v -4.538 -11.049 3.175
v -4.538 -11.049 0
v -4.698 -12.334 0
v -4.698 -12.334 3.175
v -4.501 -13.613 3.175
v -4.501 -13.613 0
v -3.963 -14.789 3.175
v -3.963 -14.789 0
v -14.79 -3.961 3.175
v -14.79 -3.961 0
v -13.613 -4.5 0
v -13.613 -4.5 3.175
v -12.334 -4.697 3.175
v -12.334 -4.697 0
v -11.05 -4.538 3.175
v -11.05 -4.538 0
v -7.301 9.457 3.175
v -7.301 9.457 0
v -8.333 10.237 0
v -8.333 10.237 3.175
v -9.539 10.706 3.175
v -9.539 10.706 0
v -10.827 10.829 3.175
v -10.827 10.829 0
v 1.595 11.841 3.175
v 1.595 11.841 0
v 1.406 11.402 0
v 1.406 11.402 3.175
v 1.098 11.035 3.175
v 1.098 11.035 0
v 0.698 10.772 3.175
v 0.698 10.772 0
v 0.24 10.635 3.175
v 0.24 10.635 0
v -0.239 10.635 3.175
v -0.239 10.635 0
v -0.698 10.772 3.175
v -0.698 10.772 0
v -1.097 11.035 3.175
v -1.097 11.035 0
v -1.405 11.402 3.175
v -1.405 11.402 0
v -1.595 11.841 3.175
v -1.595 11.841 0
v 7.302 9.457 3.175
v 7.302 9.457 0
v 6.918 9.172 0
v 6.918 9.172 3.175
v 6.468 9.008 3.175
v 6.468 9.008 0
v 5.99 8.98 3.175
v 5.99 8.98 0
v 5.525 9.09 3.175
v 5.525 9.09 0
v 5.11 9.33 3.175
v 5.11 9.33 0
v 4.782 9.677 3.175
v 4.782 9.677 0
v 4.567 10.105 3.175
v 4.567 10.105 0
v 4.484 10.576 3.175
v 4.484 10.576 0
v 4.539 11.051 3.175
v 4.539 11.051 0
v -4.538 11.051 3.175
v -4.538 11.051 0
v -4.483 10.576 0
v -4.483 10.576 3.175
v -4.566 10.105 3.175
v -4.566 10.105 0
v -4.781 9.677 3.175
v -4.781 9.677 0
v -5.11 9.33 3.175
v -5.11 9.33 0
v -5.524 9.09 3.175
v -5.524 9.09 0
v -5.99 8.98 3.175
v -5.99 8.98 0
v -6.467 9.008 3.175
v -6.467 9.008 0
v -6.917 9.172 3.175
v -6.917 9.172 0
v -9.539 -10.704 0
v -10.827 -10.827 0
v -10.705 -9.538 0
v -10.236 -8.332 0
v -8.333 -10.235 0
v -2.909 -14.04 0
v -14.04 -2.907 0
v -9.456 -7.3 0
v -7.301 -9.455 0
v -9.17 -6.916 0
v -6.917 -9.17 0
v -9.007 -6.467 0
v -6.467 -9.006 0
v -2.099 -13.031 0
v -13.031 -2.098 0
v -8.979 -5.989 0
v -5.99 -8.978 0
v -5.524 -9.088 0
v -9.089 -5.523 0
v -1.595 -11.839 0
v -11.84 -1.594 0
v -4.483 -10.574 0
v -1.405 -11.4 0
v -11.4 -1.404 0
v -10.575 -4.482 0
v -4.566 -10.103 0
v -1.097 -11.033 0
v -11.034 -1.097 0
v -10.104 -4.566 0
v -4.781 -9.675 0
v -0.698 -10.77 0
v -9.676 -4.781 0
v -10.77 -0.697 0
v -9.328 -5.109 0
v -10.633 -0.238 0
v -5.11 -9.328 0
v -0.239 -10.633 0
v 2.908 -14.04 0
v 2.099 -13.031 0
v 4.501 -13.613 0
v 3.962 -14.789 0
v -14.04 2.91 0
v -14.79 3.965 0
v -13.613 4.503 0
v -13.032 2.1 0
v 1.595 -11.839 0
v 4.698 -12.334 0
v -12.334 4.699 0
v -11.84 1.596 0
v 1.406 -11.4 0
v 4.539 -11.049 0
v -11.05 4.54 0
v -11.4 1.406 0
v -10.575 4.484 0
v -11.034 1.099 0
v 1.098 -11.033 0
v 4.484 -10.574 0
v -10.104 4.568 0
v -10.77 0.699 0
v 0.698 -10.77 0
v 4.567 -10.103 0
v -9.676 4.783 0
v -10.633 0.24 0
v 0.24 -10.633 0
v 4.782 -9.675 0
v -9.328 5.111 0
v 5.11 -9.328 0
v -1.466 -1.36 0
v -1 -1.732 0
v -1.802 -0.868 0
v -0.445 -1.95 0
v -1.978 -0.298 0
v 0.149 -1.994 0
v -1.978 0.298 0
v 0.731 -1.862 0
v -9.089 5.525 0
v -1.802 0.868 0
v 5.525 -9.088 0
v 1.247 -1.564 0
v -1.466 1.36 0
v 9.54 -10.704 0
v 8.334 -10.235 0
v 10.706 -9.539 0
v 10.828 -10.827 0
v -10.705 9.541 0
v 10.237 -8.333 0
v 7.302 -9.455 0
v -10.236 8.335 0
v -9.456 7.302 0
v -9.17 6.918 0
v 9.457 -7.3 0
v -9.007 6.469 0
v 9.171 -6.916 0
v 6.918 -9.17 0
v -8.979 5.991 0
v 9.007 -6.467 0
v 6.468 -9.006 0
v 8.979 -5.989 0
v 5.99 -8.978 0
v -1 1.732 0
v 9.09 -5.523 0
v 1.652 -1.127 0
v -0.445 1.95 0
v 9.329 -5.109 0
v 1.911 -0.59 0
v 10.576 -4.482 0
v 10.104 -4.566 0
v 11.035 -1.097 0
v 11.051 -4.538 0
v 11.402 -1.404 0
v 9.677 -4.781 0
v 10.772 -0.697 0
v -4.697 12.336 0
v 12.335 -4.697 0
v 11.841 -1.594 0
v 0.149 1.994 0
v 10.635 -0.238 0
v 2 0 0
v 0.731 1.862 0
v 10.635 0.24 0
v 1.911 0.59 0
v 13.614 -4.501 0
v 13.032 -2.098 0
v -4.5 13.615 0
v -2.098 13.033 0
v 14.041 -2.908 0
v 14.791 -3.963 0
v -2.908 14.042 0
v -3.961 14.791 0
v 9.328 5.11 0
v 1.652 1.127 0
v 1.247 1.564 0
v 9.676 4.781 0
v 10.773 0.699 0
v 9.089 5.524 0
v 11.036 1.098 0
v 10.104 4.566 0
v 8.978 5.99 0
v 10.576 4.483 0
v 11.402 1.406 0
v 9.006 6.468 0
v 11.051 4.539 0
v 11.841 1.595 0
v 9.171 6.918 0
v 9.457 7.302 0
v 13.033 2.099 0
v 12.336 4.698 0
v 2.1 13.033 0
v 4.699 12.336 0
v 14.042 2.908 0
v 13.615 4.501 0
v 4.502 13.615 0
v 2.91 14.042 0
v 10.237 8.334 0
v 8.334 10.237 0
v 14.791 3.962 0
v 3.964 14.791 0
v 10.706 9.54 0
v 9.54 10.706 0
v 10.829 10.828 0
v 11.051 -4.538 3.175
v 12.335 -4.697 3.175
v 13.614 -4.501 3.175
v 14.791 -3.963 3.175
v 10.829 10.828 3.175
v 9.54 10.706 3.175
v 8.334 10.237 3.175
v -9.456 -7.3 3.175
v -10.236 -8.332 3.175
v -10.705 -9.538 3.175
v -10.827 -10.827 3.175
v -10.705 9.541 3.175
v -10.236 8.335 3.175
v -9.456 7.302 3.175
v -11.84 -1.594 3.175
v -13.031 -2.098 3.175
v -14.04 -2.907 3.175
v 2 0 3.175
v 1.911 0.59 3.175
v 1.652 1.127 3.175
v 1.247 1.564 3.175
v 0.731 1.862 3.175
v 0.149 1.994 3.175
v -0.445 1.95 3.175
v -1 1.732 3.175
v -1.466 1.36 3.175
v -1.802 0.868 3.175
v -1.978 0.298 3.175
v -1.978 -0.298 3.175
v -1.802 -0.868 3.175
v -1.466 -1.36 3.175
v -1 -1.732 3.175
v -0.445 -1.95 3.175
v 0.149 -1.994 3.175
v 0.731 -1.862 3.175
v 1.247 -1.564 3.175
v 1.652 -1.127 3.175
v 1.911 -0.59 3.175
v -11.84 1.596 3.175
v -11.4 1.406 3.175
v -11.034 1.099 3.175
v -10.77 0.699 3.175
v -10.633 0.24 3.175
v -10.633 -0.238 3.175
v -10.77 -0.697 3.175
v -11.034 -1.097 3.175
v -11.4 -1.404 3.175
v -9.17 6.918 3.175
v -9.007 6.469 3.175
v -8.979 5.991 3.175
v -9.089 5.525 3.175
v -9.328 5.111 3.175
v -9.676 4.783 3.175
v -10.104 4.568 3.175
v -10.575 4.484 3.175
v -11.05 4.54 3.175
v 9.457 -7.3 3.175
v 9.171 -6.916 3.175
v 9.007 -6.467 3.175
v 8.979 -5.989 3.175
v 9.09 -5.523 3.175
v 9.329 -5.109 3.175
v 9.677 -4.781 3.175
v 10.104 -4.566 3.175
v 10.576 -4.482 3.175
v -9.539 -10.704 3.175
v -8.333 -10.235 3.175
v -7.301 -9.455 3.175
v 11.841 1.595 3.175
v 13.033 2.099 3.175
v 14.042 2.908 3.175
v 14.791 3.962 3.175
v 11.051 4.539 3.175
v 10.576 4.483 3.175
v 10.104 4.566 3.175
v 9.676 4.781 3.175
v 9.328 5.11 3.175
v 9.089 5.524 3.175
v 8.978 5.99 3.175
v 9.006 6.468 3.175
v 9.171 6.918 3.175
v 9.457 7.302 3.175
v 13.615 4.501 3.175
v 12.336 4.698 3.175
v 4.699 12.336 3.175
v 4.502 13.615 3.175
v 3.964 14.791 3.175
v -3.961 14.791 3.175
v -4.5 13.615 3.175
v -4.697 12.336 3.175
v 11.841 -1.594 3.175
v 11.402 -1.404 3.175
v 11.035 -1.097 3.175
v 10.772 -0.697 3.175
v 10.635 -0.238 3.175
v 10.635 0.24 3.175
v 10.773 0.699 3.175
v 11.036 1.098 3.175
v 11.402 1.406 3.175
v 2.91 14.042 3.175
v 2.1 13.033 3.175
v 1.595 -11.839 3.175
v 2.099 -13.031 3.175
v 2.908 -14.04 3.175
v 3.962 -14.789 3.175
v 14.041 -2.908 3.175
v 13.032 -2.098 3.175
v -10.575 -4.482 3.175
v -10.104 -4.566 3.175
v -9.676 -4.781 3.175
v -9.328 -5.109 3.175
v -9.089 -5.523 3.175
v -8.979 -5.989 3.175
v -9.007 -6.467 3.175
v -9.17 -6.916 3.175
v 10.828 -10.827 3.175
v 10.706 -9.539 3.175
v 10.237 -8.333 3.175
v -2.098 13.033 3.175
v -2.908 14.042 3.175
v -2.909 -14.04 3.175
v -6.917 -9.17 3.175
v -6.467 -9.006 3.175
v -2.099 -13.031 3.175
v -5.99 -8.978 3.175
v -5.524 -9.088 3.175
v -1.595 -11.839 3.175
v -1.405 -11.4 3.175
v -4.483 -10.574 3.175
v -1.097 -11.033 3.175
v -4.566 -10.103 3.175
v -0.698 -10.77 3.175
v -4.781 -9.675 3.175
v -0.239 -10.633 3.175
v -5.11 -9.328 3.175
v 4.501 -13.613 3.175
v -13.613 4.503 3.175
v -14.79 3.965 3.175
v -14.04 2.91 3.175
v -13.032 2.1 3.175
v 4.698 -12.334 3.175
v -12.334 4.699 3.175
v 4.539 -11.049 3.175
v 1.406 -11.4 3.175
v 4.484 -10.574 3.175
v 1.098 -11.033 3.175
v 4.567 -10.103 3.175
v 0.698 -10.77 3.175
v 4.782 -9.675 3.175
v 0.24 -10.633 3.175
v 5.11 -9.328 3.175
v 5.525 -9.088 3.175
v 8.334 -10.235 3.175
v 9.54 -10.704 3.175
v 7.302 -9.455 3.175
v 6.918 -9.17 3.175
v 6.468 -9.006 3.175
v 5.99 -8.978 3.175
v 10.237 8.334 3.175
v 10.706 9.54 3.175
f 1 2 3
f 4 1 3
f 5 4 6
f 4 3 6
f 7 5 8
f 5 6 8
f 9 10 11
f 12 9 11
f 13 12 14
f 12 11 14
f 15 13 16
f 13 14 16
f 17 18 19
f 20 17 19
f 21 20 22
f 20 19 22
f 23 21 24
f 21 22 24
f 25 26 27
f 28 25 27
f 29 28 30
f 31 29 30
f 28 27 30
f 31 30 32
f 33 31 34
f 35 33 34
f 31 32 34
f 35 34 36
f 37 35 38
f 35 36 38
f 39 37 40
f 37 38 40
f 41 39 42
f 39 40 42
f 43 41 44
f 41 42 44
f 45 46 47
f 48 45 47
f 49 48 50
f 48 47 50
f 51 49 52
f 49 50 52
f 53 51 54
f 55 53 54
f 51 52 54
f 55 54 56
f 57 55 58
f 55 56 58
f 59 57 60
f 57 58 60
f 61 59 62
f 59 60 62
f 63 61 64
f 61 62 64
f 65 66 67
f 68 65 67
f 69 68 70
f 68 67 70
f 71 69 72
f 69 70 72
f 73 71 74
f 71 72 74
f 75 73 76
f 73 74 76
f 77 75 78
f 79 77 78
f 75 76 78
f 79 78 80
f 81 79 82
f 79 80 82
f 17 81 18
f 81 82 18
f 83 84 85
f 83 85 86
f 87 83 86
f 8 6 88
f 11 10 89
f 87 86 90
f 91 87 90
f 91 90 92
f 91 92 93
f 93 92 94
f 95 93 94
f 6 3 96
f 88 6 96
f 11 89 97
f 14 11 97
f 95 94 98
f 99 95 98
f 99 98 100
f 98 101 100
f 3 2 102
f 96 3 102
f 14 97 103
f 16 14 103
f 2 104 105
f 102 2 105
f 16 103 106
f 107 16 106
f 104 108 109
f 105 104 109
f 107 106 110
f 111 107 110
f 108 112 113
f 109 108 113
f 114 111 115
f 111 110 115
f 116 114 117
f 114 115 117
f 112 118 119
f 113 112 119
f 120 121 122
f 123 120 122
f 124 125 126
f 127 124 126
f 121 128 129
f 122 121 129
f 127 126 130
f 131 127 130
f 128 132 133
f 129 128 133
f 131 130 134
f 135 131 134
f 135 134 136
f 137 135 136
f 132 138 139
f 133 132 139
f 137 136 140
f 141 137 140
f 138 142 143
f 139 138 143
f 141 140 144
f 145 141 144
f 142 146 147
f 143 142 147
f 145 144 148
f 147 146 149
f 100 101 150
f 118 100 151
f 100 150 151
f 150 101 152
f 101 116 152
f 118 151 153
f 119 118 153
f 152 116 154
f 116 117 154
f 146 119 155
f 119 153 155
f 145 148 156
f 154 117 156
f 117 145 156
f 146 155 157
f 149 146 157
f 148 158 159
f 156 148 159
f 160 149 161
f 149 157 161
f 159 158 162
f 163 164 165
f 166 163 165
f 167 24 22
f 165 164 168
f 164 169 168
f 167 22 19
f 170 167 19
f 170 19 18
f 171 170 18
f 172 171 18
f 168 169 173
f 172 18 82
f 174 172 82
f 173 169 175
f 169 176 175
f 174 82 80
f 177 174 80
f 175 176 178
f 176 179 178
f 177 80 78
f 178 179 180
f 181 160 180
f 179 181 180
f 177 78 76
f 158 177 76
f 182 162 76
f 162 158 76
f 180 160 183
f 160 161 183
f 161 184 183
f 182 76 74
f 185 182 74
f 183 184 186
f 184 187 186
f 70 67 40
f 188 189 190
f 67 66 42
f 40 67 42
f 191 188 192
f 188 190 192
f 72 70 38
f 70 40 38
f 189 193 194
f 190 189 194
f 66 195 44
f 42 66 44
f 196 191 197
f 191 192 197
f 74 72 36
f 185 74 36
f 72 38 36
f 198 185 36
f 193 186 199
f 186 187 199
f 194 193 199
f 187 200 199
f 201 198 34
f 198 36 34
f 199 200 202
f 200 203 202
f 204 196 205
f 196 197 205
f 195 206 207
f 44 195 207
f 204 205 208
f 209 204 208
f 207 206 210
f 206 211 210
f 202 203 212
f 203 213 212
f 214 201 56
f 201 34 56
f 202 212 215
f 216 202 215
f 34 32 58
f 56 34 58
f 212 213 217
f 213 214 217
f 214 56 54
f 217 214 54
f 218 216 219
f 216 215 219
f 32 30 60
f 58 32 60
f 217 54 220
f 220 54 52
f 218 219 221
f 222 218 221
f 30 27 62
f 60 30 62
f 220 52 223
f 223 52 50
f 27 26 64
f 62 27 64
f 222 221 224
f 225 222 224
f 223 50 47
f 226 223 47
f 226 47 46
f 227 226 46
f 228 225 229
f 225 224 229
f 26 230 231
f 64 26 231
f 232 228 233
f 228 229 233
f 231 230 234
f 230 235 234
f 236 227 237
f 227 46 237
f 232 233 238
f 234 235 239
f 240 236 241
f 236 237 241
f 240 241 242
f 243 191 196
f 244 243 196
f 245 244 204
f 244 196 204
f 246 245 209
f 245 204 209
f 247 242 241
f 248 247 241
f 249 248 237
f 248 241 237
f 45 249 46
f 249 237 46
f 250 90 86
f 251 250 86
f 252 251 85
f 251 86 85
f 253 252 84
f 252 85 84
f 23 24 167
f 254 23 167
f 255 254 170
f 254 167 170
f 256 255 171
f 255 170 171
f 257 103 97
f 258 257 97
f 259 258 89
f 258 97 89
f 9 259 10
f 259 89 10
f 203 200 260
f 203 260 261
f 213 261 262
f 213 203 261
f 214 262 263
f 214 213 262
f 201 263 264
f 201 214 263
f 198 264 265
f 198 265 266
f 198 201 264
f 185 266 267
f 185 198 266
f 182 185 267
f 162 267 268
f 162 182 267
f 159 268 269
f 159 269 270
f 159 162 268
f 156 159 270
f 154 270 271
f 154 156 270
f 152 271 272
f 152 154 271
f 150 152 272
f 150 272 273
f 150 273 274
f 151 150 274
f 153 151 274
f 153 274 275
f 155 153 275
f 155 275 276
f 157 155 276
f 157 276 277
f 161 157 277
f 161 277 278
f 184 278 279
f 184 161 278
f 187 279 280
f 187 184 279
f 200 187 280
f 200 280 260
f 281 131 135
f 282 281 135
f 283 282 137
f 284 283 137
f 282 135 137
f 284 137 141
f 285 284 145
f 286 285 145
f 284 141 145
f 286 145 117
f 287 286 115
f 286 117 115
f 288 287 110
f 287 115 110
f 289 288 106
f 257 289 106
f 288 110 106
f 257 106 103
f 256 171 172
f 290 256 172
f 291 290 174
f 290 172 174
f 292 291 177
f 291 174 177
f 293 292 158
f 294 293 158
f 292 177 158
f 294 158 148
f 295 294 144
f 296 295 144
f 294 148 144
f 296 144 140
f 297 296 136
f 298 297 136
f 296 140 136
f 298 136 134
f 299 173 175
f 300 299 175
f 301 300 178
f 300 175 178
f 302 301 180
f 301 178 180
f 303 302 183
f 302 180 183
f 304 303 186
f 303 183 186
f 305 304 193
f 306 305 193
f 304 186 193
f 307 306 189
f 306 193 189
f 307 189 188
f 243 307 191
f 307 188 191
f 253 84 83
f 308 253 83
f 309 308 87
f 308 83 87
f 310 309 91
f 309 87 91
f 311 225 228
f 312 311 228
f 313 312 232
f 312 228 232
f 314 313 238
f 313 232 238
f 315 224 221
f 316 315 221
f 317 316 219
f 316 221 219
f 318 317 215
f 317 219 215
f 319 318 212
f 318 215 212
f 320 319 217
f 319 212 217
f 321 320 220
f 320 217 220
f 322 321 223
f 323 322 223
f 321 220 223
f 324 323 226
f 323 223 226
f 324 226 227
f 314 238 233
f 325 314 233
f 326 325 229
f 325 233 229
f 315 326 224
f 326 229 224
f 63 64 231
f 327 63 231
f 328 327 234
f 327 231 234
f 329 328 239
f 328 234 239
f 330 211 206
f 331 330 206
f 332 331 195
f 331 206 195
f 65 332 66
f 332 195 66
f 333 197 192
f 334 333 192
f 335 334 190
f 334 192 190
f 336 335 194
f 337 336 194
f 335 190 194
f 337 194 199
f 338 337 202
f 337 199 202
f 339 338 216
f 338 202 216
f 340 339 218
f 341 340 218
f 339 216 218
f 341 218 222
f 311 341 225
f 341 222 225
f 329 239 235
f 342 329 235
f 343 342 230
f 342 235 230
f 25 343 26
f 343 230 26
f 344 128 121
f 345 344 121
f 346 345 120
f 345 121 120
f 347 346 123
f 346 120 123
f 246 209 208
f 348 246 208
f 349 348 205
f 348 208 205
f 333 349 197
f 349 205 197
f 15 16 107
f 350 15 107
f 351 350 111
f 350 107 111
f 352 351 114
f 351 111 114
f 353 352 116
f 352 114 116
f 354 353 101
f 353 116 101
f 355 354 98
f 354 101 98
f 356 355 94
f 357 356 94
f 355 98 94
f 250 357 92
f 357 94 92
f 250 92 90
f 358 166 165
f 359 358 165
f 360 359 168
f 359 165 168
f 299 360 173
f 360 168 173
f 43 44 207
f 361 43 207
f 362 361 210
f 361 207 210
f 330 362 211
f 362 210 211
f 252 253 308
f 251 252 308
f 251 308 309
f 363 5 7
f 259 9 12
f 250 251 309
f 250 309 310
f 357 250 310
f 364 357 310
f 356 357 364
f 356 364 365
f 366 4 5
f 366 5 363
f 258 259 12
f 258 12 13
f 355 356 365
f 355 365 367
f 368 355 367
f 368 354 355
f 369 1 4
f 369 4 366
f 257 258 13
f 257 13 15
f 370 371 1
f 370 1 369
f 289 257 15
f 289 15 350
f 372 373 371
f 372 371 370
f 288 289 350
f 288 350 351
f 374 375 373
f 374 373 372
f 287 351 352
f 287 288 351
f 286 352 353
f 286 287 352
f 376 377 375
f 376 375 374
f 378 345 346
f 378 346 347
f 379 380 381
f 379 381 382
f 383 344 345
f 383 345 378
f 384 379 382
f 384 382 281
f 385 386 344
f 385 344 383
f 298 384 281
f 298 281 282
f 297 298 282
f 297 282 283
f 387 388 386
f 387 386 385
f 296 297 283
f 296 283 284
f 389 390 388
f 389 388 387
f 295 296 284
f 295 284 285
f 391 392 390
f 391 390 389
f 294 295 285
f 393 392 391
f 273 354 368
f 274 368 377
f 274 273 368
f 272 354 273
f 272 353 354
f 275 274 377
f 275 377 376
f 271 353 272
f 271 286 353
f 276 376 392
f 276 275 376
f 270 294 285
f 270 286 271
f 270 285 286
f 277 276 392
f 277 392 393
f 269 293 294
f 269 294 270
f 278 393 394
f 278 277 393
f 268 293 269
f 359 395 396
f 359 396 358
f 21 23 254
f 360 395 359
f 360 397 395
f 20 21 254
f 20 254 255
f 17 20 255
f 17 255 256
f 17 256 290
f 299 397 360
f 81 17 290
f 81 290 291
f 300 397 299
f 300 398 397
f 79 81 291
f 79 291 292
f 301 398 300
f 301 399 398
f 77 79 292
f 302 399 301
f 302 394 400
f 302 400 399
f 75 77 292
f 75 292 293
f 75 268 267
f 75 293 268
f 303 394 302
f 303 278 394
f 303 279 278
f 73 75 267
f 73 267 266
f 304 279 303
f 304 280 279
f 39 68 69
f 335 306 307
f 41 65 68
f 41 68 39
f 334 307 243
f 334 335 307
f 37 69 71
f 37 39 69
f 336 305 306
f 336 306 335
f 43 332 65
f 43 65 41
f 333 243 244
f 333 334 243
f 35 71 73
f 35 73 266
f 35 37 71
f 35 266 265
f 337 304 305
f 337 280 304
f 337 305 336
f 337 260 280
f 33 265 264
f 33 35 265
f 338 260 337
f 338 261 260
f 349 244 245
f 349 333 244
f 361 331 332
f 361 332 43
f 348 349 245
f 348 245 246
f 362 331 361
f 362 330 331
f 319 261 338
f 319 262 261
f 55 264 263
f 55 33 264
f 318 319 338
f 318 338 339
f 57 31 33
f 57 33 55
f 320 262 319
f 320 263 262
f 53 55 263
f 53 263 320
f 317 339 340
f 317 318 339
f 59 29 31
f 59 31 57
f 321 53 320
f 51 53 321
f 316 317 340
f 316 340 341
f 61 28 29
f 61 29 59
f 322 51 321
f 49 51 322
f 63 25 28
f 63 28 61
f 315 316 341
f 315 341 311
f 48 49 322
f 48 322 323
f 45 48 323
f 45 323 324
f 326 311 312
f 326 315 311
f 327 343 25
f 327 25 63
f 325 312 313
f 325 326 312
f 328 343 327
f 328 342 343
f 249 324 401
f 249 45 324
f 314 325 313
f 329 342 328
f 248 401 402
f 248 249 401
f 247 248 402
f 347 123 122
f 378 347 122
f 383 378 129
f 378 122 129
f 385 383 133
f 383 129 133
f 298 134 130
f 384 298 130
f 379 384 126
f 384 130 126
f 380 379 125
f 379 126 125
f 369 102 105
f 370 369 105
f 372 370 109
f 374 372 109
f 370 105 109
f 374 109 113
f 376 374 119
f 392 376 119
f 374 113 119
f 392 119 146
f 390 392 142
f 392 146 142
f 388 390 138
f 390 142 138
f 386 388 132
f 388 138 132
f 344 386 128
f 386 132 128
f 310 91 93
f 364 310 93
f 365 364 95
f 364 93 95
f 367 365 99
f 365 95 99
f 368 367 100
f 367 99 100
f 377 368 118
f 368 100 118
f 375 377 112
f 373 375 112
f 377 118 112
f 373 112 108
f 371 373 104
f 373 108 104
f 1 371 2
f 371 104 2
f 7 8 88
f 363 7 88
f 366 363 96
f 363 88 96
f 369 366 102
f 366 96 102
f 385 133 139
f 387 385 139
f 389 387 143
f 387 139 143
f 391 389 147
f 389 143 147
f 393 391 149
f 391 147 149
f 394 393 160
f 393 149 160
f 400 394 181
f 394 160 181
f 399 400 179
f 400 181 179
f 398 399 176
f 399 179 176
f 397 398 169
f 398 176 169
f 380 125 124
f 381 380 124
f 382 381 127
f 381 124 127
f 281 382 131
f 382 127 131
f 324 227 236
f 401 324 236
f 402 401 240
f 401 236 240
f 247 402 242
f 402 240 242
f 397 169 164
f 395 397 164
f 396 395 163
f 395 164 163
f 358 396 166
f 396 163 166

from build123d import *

# Parameters (mm, degrees)
SKETCH2_R           = 2
BOSS_EXTRUDE2_DEPTH = 3.175


with BuildPart() as part:
    # Sketch2 → Boss-Extrude2 (new body)
    with BuildSketch(Plane.XY):
        with BuildLine():
            ThreePointArc((9.456794765, 7.302125235), (10.51328966, 8.920913041), (10.82870315, 10.828049574))
            ThreePointArc((10.82870315, 10.828049574), (8.921045244, 10.513465667), (7.301533296, 9.457386704))
            ThreePointArc((7.301533296, 9.457386704), (5.308889045, 9.194845217), (4.539183834, 11.051485471))
            ThreePointArc((4.539183834, 11.051485471), (4.64471403, 12.981928422), (3.964051405, 14.791471183))
            ThreePointArc((3.964051405, 14.791471183), (2.469674584, 13.565372247), (1.59532555, 11.841424903))
            ThreePointArc((1.59532555, 11.841424903), (0.000409384, 10.617090374), (-1.594506782, 11.841424903))
            ThreePointArc((-1.594506782, 11.841424903), (-2.468043552, 13.565085875), (-3.961395494, 14.791451895))
            ThreePointArc((-3.961395494, 14.791451895), (-4.64300424, 12.982116437), (-4.538365066, 11.051485471))
            ThreePointArc((-4.538365066, 11.051485471), (-5.308070277, 9.194845217), (-7.300714528, 9.457386704))
            ThreePointArc((-7.300714528, 9.457386704), (-8.919846484, 10.513683908), (-10.827230806, 10.82870315))
            ThreePointArc((-10.827230806, 10.82870315), (-10.512252617, 8.921293027), (-9.455975997, 7.302125235))
            ThreePointArc((-9.455975997, 7.302125235), (-9.19343451, 5.309480984), (-11.050074764, 4.539775774))
            ThreePointArc((-11.050074764, 4.539775774), (-12.980517715, 4.64530597), (-14.790060475, 3.964643344))
            ThreePointArc((-14.790060475, 3.964643344), (-13.56396154, 2.470266524), (-11.840014195, 1.595917489))
            ThreePointArc((-11.840014195, 1.595917489), (-10.615679667, 0.001001323), (-11.840014195, -1.593914842))
            ThreePointArc((-11.840014195, -1.593914842), (-13.563675168, -2.467451613), (-14.790041187, -3.960803554))
            ThreePointArc((-14.790041187, -3.960803554), (-12.980705729, -4.6424123), (-11.050074764, -4.537773127))
            ThreePointArc((-11.050074764, -4.537773127), (-9.19343451, -5.307478337), (-9.455975997, -7.300122588))
            ThreePointArc((-9.455975997, -7.300122588), (-10.512273201, -8.919254544), (-10.827292443, -10.826638866))
            ThreePointArc((-10.827292443, -10.826638866), (-8.91988232, -10.511660678), (-7.300714528, -9.455384057))
            ThreePointArc((-7.300714528, -9.455384057), (-5.308070277, -9.19284257), (-4.538365066, -11.049482824))
            ThreePointArc((-4.538365066, -11.049482824), (-4.643895262, -12.979925775), (-3.963232637, -14.789468536))
            ThreePointArc((-3.963232637, -14.789468536), (-2.468855816, -13.5633696), (-1.594506782, -11.839422256))
            ThreePointArc((-1.594506782, -11.839422256), (0.000409384, -10.615087727), (1.59532555, -11.839422256))
            ThreePointArc((1.59532555, -11.839422256), (2.46886232, -13.563083228), (3.962214262, -14.789449248))
            ThreePointArc((3.962214262, -14.789449248), (4.643823008, -12.98011379), (4.539183834, -11.049482824))
            ThreePointArc((4.539183834, -11.049482824), (5.308889045, -9.19284257), (7.301533296, -9.455384057))
            ThreePointArc((7.301533296, -9.455384057), (8.920665252, -10.511681261), (10.828049574, -10.826700503))
            ThreePointArc((10.828049574, -10.826700503), (10.513071385, -8.91929038), (9.456794765, -7.300122588))
            ThreePointArc((9.456794765, -7.300122588), (9.194253278, -5.307478337), (11.050893532, -4.537773127))
            ThreePointArc((11.050893532, -4.537773127), (12.981336483, -4.643303323), (14.790879243, -3.962640697))
            ThreePointArc((14.790879243, -3.962640697), (13.564780308, -2.468263877), (11.840832964, -1.593914842))
            ThreePointArc((11.840832964, -1.593914842), (10.617899153, 0.000932392), (11.841424903, 1.59532555))
            ThreePointArc((11.841424903, 1.59532555), (13.565085875, 2.46886232), (14.791451895, 3.962214262))
            ThreePointArc((14.791451895, 3.962214262), (12.982116437, 4.643823008), (11.051485471, 4.539183834))
            ThreePointArc((11.051485471, 4.539183834), (9.193282623, 5.308357949), (9.456794765, 7.302125235))
        make_face()
        Circle(SKETCH2_R, mode=Mode.SUBTRACT)
    extrude(amount=BOSS_EXTRUDE2_DEPTH)


solid = part.part
